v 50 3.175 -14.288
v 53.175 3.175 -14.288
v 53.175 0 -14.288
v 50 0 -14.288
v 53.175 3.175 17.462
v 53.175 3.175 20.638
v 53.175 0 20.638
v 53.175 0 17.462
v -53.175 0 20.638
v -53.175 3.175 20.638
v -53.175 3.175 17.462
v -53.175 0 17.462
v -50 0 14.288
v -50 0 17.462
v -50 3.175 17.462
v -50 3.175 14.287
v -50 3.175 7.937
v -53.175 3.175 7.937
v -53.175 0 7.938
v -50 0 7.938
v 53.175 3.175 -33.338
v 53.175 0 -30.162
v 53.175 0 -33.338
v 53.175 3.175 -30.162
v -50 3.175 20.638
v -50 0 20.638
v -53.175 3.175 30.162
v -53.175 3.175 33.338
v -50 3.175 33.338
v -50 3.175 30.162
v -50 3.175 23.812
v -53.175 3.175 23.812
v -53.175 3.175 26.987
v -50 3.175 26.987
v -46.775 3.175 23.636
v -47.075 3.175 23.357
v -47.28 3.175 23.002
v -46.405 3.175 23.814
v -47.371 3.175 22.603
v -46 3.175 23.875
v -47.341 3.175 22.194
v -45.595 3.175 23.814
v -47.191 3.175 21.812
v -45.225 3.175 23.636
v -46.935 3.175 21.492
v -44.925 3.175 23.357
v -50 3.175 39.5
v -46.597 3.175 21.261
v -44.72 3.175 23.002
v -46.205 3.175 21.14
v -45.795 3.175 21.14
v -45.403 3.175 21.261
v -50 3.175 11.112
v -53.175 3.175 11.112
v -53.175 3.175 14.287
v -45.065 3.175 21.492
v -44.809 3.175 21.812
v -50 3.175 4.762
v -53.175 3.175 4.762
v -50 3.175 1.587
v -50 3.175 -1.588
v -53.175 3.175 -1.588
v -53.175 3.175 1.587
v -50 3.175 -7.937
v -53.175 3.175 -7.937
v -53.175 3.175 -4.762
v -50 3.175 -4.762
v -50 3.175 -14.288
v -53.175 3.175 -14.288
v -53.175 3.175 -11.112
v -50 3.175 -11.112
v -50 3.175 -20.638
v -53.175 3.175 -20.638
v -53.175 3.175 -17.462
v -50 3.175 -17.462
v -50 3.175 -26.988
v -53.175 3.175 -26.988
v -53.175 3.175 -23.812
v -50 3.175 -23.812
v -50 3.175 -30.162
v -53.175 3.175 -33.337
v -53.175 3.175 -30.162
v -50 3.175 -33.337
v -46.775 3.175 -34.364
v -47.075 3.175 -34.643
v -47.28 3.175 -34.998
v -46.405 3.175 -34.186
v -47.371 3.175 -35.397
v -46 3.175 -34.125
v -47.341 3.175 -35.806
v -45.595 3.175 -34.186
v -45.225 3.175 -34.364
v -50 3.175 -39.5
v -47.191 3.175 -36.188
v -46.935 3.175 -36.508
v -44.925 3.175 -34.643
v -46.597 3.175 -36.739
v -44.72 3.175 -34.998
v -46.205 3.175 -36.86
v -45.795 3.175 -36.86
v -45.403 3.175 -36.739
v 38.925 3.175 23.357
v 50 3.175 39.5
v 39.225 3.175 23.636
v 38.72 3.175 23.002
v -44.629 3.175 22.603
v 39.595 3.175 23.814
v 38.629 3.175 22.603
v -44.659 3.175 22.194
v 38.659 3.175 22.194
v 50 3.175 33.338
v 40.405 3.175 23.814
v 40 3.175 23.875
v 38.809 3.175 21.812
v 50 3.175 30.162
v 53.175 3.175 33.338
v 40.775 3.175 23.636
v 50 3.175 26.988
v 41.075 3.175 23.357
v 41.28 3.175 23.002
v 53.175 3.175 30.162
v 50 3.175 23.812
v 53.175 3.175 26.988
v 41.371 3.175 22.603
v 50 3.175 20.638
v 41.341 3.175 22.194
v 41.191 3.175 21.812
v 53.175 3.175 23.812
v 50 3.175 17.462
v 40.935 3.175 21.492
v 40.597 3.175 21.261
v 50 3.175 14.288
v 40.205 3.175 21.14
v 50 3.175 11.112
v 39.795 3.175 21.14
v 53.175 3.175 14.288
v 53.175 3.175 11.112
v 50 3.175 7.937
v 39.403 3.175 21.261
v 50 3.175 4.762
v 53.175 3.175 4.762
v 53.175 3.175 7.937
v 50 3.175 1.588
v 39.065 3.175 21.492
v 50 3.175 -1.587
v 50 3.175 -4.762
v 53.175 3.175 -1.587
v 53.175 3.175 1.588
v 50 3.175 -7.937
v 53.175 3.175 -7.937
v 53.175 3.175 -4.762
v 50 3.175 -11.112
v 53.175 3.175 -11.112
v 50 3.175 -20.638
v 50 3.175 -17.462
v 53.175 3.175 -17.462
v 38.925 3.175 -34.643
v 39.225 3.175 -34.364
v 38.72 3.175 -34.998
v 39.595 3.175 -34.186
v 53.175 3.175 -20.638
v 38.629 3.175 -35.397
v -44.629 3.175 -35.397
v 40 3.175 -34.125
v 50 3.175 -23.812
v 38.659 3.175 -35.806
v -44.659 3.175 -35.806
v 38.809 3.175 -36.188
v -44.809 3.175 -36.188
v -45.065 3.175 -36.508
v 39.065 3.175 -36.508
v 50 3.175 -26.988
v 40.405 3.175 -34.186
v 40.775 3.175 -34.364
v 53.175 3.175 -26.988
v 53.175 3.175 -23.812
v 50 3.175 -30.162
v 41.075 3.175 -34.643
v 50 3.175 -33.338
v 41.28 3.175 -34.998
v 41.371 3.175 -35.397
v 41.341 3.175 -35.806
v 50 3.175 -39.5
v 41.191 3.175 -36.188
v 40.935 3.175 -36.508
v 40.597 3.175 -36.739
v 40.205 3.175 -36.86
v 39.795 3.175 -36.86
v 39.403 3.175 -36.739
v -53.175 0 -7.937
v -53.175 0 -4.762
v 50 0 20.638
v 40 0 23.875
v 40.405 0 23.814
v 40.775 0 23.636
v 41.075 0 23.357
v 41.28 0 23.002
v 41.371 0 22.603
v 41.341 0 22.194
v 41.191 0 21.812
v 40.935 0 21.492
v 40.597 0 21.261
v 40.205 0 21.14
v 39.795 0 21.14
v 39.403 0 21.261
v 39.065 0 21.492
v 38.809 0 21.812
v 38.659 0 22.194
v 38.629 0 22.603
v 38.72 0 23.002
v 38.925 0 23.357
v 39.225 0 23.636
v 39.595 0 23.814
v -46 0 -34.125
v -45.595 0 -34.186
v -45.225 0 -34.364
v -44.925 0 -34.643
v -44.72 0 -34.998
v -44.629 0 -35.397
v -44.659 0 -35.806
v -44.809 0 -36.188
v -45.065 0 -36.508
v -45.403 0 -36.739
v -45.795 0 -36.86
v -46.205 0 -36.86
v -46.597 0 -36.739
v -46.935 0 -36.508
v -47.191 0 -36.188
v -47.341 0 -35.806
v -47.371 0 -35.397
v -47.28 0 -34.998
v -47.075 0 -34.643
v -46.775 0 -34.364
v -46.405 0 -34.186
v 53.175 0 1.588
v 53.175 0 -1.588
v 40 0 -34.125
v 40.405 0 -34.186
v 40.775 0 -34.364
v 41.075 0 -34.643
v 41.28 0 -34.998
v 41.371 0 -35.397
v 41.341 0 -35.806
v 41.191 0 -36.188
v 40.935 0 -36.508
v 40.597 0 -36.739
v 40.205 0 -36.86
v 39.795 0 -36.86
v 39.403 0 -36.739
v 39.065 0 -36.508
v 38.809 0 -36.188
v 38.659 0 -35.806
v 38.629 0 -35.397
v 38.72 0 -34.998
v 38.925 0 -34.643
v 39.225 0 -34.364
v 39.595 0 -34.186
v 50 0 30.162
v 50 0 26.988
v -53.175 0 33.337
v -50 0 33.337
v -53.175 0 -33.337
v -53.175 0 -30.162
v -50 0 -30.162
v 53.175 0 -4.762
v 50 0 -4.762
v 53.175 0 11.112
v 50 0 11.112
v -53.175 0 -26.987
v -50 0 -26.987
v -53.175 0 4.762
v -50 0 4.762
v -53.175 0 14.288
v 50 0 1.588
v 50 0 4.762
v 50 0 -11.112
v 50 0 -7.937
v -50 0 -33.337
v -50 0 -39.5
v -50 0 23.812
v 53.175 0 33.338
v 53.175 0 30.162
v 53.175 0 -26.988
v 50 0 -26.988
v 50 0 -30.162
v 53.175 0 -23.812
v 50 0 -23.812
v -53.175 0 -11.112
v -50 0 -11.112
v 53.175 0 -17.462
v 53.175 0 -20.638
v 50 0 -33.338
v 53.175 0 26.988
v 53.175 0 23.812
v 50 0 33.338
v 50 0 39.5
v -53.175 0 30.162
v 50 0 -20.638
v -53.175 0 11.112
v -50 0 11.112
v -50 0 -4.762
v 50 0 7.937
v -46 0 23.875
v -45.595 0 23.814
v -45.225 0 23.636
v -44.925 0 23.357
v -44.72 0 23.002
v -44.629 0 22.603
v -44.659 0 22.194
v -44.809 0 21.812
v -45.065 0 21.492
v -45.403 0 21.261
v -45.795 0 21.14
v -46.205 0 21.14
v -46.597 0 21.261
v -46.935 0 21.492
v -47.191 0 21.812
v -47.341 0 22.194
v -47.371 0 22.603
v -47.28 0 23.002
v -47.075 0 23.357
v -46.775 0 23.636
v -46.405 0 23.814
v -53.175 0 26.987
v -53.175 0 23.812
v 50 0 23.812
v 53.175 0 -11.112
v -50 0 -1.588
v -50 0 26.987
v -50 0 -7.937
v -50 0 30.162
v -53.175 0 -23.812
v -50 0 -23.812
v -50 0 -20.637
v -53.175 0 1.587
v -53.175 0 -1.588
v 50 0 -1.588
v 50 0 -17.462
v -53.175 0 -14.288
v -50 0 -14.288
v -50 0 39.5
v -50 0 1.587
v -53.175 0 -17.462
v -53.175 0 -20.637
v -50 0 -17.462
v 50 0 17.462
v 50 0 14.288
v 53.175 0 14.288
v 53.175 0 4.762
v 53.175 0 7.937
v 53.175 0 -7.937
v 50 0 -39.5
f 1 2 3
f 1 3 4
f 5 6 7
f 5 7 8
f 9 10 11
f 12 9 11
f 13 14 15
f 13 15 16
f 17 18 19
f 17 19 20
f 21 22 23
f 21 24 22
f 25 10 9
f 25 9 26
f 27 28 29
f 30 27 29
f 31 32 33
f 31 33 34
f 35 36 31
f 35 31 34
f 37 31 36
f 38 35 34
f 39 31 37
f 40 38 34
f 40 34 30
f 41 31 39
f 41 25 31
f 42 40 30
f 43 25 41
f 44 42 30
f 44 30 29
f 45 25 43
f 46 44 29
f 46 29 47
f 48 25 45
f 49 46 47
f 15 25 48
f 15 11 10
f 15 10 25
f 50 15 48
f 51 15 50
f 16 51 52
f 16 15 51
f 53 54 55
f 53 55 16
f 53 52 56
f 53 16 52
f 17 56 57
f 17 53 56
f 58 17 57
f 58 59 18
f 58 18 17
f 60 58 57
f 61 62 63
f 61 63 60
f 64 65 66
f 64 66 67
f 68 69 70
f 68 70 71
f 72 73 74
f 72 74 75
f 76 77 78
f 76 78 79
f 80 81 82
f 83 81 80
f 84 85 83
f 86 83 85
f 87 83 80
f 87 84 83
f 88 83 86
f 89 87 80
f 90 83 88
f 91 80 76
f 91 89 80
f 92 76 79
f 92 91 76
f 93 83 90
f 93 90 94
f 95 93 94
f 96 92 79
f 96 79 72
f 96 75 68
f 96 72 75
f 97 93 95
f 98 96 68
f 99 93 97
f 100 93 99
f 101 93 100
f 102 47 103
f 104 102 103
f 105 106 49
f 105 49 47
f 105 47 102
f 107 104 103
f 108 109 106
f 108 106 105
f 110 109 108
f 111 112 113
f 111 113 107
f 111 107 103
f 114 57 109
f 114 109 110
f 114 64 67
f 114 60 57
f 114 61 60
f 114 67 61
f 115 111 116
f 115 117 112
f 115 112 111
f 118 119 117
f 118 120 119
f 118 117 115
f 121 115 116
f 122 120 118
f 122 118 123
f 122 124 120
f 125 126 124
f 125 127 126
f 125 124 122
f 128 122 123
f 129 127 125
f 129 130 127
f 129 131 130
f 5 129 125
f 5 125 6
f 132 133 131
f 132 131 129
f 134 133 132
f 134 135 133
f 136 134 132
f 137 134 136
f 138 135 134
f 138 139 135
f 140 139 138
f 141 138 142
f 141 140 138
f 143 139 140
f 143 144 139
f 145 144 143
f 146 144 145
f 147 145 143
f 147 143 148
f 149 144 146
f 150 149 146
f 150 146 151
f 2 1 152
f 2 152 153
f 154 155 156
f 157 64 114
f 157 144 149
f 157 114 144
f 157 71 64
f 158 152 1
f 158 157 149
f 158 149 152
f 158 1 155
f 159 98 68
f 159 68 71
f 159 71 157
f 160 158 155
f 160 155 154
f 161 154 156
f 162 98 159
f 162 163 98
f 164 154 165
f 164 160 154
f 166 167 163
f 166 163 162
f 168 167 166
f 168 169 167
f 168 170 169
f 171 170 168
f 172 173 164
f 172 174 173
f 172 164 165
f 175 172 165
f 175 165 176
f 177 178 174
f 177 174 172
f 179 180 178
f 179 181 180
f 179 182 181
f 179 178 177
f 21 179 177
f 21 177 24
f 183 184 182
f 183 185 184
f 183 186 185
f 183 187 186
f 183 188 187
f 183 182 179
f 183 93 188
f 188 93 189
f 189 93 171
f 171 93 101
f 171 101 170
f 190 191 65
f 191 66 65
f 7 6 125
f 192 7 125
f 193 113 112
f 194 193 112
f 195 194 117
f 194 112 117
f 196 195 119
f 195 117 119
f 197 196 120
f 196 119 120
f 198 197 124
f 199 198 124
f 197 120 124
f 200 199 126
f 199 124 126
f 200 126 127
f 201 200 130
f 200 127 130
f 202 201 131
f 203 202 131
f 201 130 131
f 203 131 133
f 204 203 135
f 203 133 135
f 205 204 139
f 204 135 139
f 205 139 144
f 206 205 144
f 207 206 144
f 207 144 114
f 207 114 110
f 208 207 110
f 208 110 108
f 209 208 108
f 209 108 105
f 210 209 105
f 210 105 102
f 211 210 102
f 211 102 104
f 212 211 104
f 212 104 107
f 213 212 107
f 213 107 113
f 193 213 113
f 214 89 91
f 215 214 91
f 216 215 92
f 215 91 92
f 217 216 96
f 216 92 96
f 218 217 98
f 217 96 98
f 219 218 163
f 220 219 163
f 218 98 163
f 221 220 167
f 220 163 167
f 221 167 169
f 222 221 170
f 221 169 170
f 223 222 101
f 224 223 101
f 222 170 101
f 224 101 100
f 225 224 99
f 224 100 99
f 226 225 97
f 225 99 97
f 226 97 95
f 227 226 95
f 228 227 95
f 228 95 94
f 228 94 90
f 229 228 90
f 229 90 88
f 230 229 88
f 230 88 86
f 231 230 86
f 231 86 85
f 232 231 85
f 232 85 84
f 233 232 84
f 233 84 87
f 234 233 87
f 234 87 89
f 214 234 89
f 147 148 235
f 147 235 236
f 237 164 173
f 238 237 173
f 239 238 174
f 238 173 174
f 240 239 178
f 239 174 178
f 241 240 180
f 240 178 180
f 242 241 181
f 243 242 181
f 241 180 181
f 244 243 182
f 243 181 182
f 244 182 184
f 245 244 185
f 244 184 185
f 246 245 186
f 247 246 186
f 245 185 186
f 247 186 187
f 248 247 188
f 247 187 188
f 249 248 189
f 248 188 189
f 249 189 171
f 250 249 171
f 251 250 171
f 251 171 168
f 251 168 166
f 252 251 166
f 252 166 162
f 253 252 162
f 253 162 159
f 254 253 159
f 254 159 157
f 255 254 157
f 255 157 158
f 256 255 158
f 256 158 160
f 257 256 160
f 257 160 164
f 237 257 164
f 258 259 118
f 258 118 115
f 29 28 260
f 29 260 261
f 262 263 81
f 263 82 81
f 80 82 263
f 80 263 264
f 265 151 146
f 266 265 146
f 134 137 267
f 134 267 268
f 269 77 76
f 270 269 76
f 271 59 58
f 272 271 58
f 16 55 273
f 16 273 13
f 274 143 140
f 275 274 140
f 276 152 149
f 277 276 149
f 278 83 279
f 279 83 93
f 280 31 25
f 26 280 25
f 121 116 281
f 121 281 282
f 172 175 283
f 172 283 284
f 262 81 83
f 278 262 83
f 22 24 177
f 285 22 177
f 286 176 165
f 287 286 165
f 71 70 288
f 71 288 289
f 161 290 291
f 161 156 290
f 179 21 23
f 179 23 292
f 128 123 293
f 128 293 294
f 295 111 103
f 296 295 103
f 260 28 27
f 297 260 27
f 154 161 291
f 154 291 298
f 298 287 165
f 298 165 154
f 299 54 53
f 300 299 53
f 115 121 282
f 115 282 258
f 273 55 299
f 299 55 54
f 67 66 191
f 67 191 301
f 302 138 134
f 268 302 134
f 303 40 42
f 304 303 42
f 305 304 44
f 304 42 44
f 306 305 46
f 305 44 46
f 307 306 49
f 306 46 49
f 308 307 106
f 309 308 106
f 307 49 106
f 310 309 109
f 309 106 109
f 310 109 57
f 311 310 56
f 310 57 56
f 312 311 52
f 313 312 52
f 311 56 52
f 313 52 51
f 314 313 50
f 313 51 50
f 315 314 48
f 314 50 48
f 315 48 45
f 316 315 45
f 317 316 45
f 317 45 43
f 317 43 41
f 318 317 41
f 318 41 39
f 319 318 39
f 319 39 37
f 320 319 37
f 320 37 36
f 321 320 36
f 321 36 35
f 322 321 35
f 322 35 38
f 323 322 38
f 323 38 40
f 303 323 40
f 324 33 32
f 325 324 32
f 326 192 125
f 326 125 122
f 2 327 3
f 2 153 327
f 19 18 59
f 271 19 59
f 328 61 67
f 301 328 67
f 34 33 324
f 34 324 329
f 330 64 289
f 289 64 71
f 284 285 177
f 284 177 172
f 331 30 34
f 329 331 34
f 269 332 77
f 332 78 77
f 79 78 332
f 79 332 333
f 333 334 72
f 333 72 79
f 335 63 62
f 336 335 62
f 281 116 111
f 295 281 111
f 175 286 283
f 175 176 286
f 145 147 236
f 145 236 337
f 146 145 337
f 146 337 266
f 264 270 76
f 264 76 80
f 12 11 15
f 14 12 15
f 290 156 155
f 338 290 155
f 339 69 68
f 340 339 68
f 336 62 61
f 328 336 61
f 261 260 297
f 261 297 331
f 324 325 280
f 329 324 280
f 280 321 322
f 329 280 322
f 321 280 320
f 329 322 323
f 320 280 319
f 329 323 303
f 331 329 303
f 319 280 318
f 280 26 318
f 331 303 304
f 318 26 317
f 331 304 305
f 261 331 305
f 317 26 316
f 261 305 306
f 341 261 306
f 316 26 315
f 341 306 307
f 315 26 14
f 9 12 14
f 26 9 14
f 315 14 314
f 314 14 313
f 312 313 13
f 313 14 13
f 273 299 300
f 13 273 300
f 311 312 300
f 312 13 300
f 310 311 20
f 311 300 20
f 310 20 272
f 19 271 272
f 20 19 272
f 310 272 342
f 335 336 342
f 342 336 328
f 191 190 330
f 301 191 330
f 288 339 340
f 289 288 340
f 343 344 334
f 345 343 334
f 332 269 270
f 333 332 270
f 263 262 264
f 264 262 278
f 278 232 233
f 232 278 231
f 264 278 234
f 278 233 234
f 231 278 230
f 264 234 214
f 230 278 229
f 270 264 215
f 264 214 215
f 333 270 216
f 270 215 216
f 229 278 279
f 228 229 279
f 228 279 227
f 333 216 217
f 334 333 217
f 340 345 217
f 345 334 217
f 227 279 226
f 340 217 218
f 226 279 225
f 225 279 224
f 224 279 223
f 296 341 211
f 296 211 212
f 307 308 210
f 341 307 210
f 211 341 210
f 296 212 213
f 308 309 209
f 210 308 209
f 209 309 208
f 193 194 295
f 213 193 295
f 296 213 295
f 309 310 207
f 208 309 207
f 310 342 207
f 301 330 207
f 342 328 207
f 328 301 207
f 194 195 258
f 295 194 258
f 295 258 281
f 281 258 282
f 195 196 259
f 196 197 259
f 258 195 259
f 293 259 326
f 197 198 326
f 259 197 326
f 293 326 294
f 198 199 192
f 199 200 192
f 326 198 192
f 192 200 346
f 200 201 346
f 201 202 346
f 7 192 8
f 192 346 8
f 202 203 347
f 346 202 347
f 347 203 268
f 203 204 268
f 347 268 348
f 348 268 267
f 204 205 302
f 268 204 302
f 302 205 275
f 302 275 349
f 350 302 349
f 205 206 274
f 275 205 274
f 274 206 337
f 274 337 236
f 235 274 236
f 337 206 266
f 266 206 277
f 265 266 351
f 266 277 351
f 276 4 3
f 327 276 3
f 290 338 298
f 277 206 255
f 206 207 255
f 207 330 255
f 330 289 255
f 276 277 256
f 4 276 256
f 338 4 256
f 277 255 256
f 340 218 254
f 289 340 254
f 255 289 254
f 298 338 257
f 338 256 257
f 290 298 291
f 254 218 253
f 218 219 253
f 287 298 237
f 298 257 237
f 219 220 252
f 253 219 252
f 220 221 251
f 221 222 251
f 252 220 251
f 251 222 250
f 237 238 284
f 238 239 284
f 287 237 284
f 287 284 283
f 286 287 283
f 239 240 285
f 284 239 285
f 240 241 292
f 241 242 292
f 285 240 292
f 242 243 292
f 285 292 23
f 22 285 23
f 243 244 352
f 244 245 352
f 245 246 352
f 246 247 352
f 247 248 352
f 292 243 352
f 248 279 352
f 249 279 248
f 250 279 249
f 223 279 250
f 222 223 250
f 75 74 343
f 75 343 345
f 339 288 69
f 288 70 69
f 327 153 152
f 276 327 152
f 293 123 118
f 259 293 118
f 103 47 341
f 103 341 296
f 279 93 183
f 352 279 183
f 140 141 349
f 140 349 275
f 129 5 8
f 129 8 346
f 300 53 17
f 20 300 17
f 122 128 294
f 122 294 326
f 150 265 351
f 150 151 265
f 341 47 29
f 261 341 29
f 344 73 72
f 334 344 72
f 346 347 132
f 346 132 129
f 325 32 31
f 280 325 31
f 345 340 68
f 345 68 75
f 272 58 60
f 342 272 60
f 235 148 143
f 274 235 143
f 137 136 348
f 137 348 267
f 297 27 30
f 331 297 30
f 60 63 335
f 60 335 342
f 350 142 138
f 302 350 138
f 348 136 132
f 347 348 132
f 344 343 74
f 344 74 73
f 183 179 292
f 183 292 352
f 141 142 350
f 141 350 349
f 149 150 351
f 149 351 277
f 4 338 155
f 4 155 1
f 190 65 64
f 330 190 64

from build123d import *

# Parameters (mm, degrees)
SKETCH1_W                = 100
SKETCH1_H                = 79
BOSS_EXTRUDE1_DEPTH      = 3.175
SKETCH3_R                = 1.375
CUT_EXTRUDE1_DEPTH       = 10
SKETCH4_W                = 6.35
SKETCH4_H                = 79
BOSS_EXTRUDE2_DEPTH      = 3.175
SKETCH5_W                = 3.175
SKETCH5_H                = 3.175
CUT_EXTRUDE2_DEPTH       = 10
LPATTERN1_COUNT          = 7
LPATTERN1_PITCH          = 6.35
LPATTERN1_COUNT_DIR2     = 7
LPATTERN1_PITCH_DIR2     = 6.35
SKETCH6_W                = 3.175
SKETCH6_H                = 2.9875
CUT_EXTRUDE3_DEPTH       = 10
MIRROR1_COPY_1_SKETCH_W  = 3.175
MIRROR1_COPY_1_SKETCH_H  = 3.175
MIRROR1_COPY_1_DEPTH     = 10
MIRROR1_COPY_2_SKETCH_W  = 3.175
MIRROR1_COPY_2_SKETCH_H  = 3.175
MIRROR1_COPY_2_DEPTH     = 10
MIRROR1_COPY_3_SKETCH_W  = 3.175
MIRROR1_COPY_3_SKETCH_H  = 3.175
MIRROR1_COPY_3_DEPTH     = 10
MIRROR1_COPY_4_SKETCH_W  = 3.175
MIRROR1_COPY_4_SKETCH_H  = 3.175
MIRROR1_COPY_4_DEPTH     = 10
MIRROR1_COPY_5_SKETCH_W  = 3.175
MIRROR1_COPY_5_SKETCH_H  = 3.175
MIRROR1_COPY_5_DEPTH     = 10
MIRROR1_COPY_6_SKETCH_W  = 3.175
MIRROR1_COPY_6_SKETCH_H  = 3.175
MIRROR1_COPY_6_DEPTH     = 10
MIRROR1_COPY_7_SKETCH_W  = 3.175
MIRROR1_COPY_7_SKETCH_H  = 3.175
MIRROR1_COPY_7_DEPTH     = 10
MIRROR1_COPY_8_SKETCH_W  = 3.175
MIRROR1_COPY_8_SKETCH_H  = 3.175
MIRROR1_COPY_8_DEPTH     = 10
MIRROR1_COPY_9_SKETCH_W  = 3.175
MIRROR1_COPY_9_SKETCH_H  = 3.175
MIRROR1_COPY_9_DEPTH     = 10
MIRROR1_COPY_10_SKETCH_W = 3.175
MIRROR1_COPY_10_SKETCH_H = 3.175
MIRROR1_COPY_10_DEPTH    = 10
MIRROR1_COPY_11_SKETCH_W = 3.175
MIRROR1_COPY_11_SKETCH_H = 3.175
MIRROR1_COPY_11_DEPTH    = 10
MIRROR1_COPY_12_SKETCH_W = 3.175
MIRROR1_COPY_12_SKETCH_H = 3.175
MIRROR1_COPY_12_DEPTH    = 10
MIRROR1_COPY_13_SKETCH_W = 3.175
MIRROR1_COPY_13_SKETCH_H = 3.175
MIRROR1_COPY_13_DEPTH    = 10
MIRROR1_COPY_14_SKETCH_W = 3.175
MIRROR1_COPY_14_SKETCH_H = 3.175
MIRROR1_COPY_14_DEPTH    = 10
MIRROR1_COPY_15_SKETCH_W = 3.175
MIRROR1_COPY_15_SKETCH_H = 3.175
MIRROR1_COPY_15_DEPTH    = 10
MIRROR1_COPY_16_SKETCH_W = 3.175
MIRROR1_COPY_16_SKETCH_H = 3.175
MIRROR1_COPY_16_DEPTH    = 10
MIRROR1_COPY_17_SKETCH_W = 3.175
MIRROR1_COPY_17_SKETCH_H = 3.175
MIRROR1_COPY_17_DEPTH    = 10
MIRROR1_COPY_18_SKETCH_W = 3.175
MIRROR1_COPY_18_SKETCH_H = 3.175
MIRROR1_COPY_18_DEPTH    = 10
MIRROR1_COPY_19_SKETCH_W = 3.175
MIRROR1_COPY_19_SKETCH_H = 3.175
MIRROR1_COPY_19_DEPTH    = 10
MIRROR1_COPY_20_SKETCH_W = 3.175
MIRROR1_COPY_20_SKETCH_H = 3.175
MIRROR1_COPY_20_DEPTH    = 10
MIRROR1_COPY_21_SKETCH_W = 3.175
MIRROR1_COPY_21_SKETCH_H = 3.175
MIRROR1_COPY_21_DEPTH    = 10
MIRROR1_COPY_22_SKETCH_W = 3.175
MIRROR1_COPY_22_SKETCH_H = 3.175
MIRROR1_COPY_22_DEPTH    = 10
MIRROR1_COPY_23_SKETCH_W = 3.175
MIRROR1_COPY_23_SKETCH_H = 3.175
MIRROR1_COPY_23_DEPTH    = 10
MIRROR1_COPY_24_SKETCH_W = 3.175
MIRROR1_COPY_24_SKETCH_H = 3.175
MIRROR1_COPY_24_DEPTH    = 10
MIRROR1_COPY_25_SKETCH_W = 3.175
MIRROR1_COPY_25_SKETCH_H = 3.175
MIRROR1_COPY_25_DEPTH    = 10
MIRROR1_COPY_26_SKETCH_W = 3.175
MIRROR1_COPY_26_SKETCH_H = 3.175
MIRROR1_COPY_26_DEPTH    = 10
MIRROR1_COPY_27_SKETCH_W = 3.175
MIRROR1_COPY_27_SKETCH_H = 3.175
MIRROR1_COPY_27_DEPTH    = 10
MIRROR1_COPY_28_SKETCH_W = 3.175
MIRROR1_COPY_28_SKETCH_H = 3.175
MIRROR1_COPY_28_DEPTH    = 10
MIRROR1_COPY_29_SKETCH_W = 3.175
MIRROR1_COPY_29_SKETCH_H = 3.175
MIRROR1_COPY_29_DEPTH    = 10
MIRROR1_COPY_30_SKETCH_W = 3.175
MIRROR1_COPY_30_SKETCH_H = 3.175
MIRROR1_COPY_30_DEPTH    = 10
MIRROR1_COPY_31_SKETCH_W = 3.175
MIRROR1_COPY_31_SKETCH_H = 3.175
MIRROR1_COPY_31_DEPTH    = 10
MIRROR1_COPY_32_SKETCH_W = 3.175
MIRROR1_COPY_32_SKETCH_H = 3.175
MIRROR1_COPY_32_DEPTH    = 10
MIRROR1_COPY_33_SKETCH_W = 3.175
MIRROR1_COPY_33_SKETCH_H = 3.175
MIRROR1_COPY_33_DEPTH    = 10
MIRROR1_COPY_34_SKETCH_W = 3.175
MIRROR1_COPY_34_SKETCH_H = 3.175
MIRROR1_COPY_34_DEPTH    = 10
MIRROR1_COPY_35_SKETCH_W = 3.175
MIRROR1_COPY_35_SKETCH_H = 3.175
MIRROR1_COPY_35_DEPTH    = 10
MIRROR1_COPY_36_SKETCH_W = 3.175
MIRROR1_COPY_36_SKETCH_H = 3.175
MIRROR1_COPY_36_DEPTH    = 10
MIRROR1_COPY_37_SKETCH_W = 3.175
MIRROR1_COPY_37_SKETCH_H = 3.175
MIRROR1_COPY_37_DEPTH    = 10
MIRROR1_COPY_38_SKETCH_W = 3.175
MIRROR1_COPY_38_SKETCH_H = 3.175
MIRROR1_COPY_38_DEPTH    = 10
MIRROR1_COPY_39_SKETCH_W = 3.175
MIRROR1_COPY_39_SKETCH_H = 3.175
MIRROR1_COPY_39_DEPTH    = 10
MIRROR1_COPY_40_SKETCH_W = 3.175
MIRROR1_COPY_40_SKETCH_H = 3.175
MIRROR1_COPY_40_DEPTH    = 10
MIRROR1_COPY_41_SKETCH_W = 3.175
MIRROR1_COPY_41_SKETCH_H = 3.175
MIRROR1_COPY_41_DEPTH    = 10
MIRROR1_COPY_42_SKETCH_W = 3.175
MIRROR1_COPY_42_SKETCH_H = 3.175
MIRROR1_COPY_42_DEPTH    = 10
MIRROR1_COPY_43_SKETCH_W = 3.175
MIRROR1_COPY_43_SKETCH_H = 3.175
MIRROR1_COPY_43_DEPTH    = 10
MIRROR1_COPY_44_SKETCH_W = 3.175
MIRROR1_COPY_44_SKETCH_H = 3.175
MIRROR1_COPY_44_DEPTH    = 10
MIRROR1_COPY_45_SKETCH_W = 3.175
MIRROR1_COPY_45_SKETCH_H = 3.175
MIRROR1_COPY_45_DEPTH    = 10
MIRROR1_COPY_46_SKETCH_W = 3.175
MIRROR1_COPY_46_SKETCH_H = 3.175
MIRROR1_COPY_46_DEPTH    = 10
MIRROR1_COPY_47_SKETCH_W = 3.175
MIRROR1_COPY_47_SKETCH_H = 3.175
MIRROR1_COPY_47_DEPTH    = 10
SKETCH7_W                = 6
SKETCH7_H                = 79
SKETCH7_R                = 1.5
BOSS_EXTRUDE3_DEPTH      = 3.175
SKETCH8_W                = 3.175
SKETCH8_H                = 79
BOSS_EXTRUDE4_DEPTH      = 3.175
SKETCH10_W               = 12.35
SKETCH10_H               = 79
CUT_EXTRUDE4_DEPTH       = 10


with BuildPart() as part:
    # Sketch1 → Boss-Extrude1 (new body)
    with BuildSketch(Plane(origin=(0, 0, 0), x_dir=(1, 0, 0), z_dir=(0, 1, 0))):
        Rectangle(SKETCH1_W, SKETCH1_H)
    extrude(amount=BOSS_EXTRUDE1_DEPTH)

    # Sketch3 → Cut-Extrude1 (cut)
    with BuildSketch(Plane(origin=(0, 3.175, 0), x_dir=(1, 0, 0), z_dir=(0, 1, 0))):
        with Locations(Location((-46, 35.5, 0), (0, 0, 270))):
            Circle(SKETCH3_R)
        with Locations(Location((-46, -22.5, 0), (0, 0, 270))):
            Circle(SKETCH3_R)
        with Locations(Location((40, 35.5, 0), (0, 0, 270))):
            Circle(SKETCH3_R)
        with Locations(Location((40, -22.5, 0), (0, 0, 270))):
            Circle(SKETCH3_R)
    extrude(amount=-CUT_EXTRUDE1_DEPTH, mode=Mode.SUBTRACT)

    # Sketch4 → Boss-Extrude2 (add)
    with BuildSketch(Plane(origin=(0, 3.175, 0), x_dir=(1, 0, 0), z_dir=(0, 1, 0))):
        with Locations((-53.175, 0)):
            Rectangle(SKETCH4_W, SKETCH4_H)
        with Locations((53.175, 0)):
            Rectangle(SKETCH4_W, SKETCH4_H)
    extrude(amount=-BOSS_EXTRUDE2_DEPTH)

    # Sketch5 → Cut-Extrude2 (cut)
    with BuildSketch(Plane(origin=(0, 3.175, 0), x_dir=(1, 0, 0), z_dir=(0, 1, 0))):
        with Locations((-51.5875, 3.175)):
            Rectangle(SKETCH5_W, SKETCH5_H)
    cut_extrude2 = extrude(amount=-CUT_EXTRUDE2_DEPTH, mode=Mode.SUBTRACT)

    # LPattern1: Cut-Extrude2 7 × 7, 1 skipped
    with Locations(*[Vector(0, 0, 1) * (i * LPATTERN1_PITCH) + Vector(0, 0, -1) * (j * LPATTERN1_PITCH_DIR2) for i in range(LPATTERN1_COUNT) for j in range(LPATTERN1_COUNT_DIR2) if (i, j) not in ((0, 0), (0, 6))]):
        add(cut_extrude2, mode=Mode.SUBTRACT)

    # Sketch6 → Cut-Extrude3 (cut)
    with BuildSketch(Plane(origin=(0, 3.175, 0), x_dir=(1, 0, 0), z_dir=(0, 1, 0))):
        with Locations((-51.5875, 38.00625)):
            Rectangle(SKETCH6_W, SKETCH6_H)
        with Locations((-51.5875, -38.00625)):
            Rectangle(SKETCH6_W, SKETCH6_H)
    cut_extrude3 = extrude(amount=-CUT_EXTRUDE3_DEPTH, mode=Mode.SUBTRACT)

    # Mirror1: Cut-Extrude2, Cut-Extrude3 across plane
    add(cut_extrude2.mirror(Plane(origin=(0, 0, 0), x_dir=(0, 0, 1), z_dir=(1, 0, 0))), mode=Mode.SUBTRACT)
    add(cut_extrude3.mirror(Plane(origin=(0, 0, 0), x_dir=(0, 0, 1), z_dir=(1, 0, 0))), mode=Mode.SUBTRACT)

    # Mirror1 copy 1 sketch → Mirror1 copy 1 (cut)
    with BuildSketch(Plane(origin=(0, 3.175, -6.35), x_dir=(-1, 0, 0), z_dir=(0, 1, 0))):
        with Locations((-51.5875, -3.175)):
            Rectangle(MIRROR1_COPY_1_SKETCH_W, MIRROR1_COPY_1_SKETCH_H)
    extrude(amount=-MIRROR1_COPY_1_DEPTH, mode=Mode.SUBTRACT)

    # Mirror1 copy 2 sketch → Mirror1 copy 2 (cut)
    with BuildSketch(Plane(origin=(0, 3.175, -12.7), x_dir=(-1, 0, 0), z_dir=(0, 1, 0))):
        with Locations((-51.5875, -3.175)):
            Rectangle(MIRROR1_COPY_2_SKETCH_W, MIRROR1_COPY_2_SKETCH_H)
    extrude(amount=-MIRROR1_COPY_2_DEPTH, mode=Mode.SUBTRACT)

    # Mirror1 copy 3 sketch → Mirror1 copy 3 (cut)
    with BuildSketch(Plane(origin=(0, 3.175, -19.05), x_dir=(-1, 0, 0), z_dir=(0, 1, 0))):
        with Locations((-51.5875, -3.175)):
            Rectangle(MIRROR1_COPY_3_SKETCH_W, MIRROR1_COPY_3_SKETCH_H)
    extrude(amount=-MIRROR1_COPY_3_DEPTH, mode=Mode.SUBTRACT)

    # Mirror1 copy 4 sketch → Mirror1 copy 4 (cut)
    with BuildSketch(Plane(origin=(0, 3.175, -25.4), x_dir=(-1, 0, 0), z_dir=(0, 1, 0))):
        with Locations((-51.5875, -3.175)):
            Rectangle(MIRROR1_COPY_4_SKETCH_W, MIRROR1_COPY_4_SKETCH_H)
    extrude(amount=-MIRROR1_COPY_4_DEPTH, mode=Mode.SUBTRACT)

    # Mirror1 copy 5 sketch → Mirror1 copy 5 (cut)
    with BuildSketch(Plane(origin=(0, 3.175, -31.75), x_dir=(-1, 0, 0), z_dir=(0, 1, 0))):
        with Locations((-51.5875, -3.175)):
            Rectangle(MIRROR1_COPY_5_SKETCH_W, MIRROR1_COPY_5_SKETCH_H)
    extrude(amount=-MIRROR1_COPY_5_DEPTH, mode=Mode.SUBTRACT)

    # Mirror1 copy 6 sketch → Mirror1 copy 6 (cut)
    with BuildSketch(Plane(origin=(0, 3.175, 6.35), x_dir=(-1, 0, 0), z_dir=(0, 1, 0))):
        with Locations((-51.5875, -3.175)):
            Rectangle(MIRROR1_COPY_6_SKETCH_W, MIRROR1_COPY_6_SKETCH_H)
    extrude(amount=-MIRROR1_COPY_6_DEPTH, mode=Mode.SUBTRACT)

    # Mirror1 copy 7 sketch → Mirror1 copy 7 (cut)
    with BuildSketch(Plane(origin=(0, 3.175, 0), x_dir=(-1, 0, 0), z_dir=(0, 1, 0))):
        with Locations((-51.5875, -3.175)):
            Rectangle(MIRROR1_COPY_7_SKETCH_W, MIRROR1_COPY_7_SKETCH_H)
    extrude(amount=-MIRROR1_COPY_7_DEPTH, mode=Mode.SUBTRACT)

    # Mirror1 copy 8 sketch → Mirror1 copy 8 (cut)
    with BuildSketch(Plane(origin=(0, 3.175, -6.35), x_dir=(-1, 0, 0), z_dir=(0, 1, 0))):
        with Locations((-51.5875, -3.175)):
            Rectangle(MIRROR1_COPY_8_SKETCH_W, MIRROR1_COPY_8_SKETCH_H)
    extrude(amount=-MIRROR1_COPY_8_DEPTH, mode=Mode.SUBTRACT)

    # Mirror1 copy 9 sketch → Mirror1 copy 9 (cut)
    with BuildSketch(Plane(origin=(0, 3.175, -12.7), x_dir=(-1, 0, 0), z_dir=(0, 1, 0))):
        with Locations((-51.5875, -3.175)):
            Rectangle(MIRROR1_COPY_9_SKETCH_W, MIRROR1_COPY_9_SKETCH_H)
    extrude(amount=-MIRROR1_COPY_9_DEPTH, mode=Mode.SUBTRACT)

    # Mirror1 copy 10 sketch → Mirror1 copy 10 (cut)
    with BuildSketch(Plane(origin=(0, 3.175, -19.05), x_dir=(-1, 0, 0), z_dir=(0, 1, 0))):
        with Locations((-51.5875, -3.175)):
            Rectangle(MIRROR1_COPY_10_SKETCH_W, MIRROR1_COPY_10_SKETCH_H)
    extrude(amount=-MIRROR1_COPY_10_DEPTH, mode=Mode.SUBTRACT)

    # Mirror1 copy 11 sketch → Mirror1 copy 11 (cut)
    with BuildSketch(Plane(origin=(0, 3.175, -25.4), x_dir=(-1, 0, 0), z_dir=(0, 1, 0))):
        with Locations((-51.5875, -3.175)):
            Rectangle(MIRROR1_COPY_11_SKETCH_W, MIRROR1_COPY_11_SKETCH_H)
    extrude(amount=-MIRROR1_COPY_11_DEPTH, mode=Mode.SUBTRACT)

    # Mirror1 copy 12 sketch → Mirror1 copy 12 (cut)
    with BuildSketch(Plane(origin=(0, 3.175, -31.75), x_dir=(-1, 0, 0), z_dir=(0, 1, 0))):
        with Locations((-51.5875, -3.175)):
            Rectangle(MIRROR1_COPY_12_SKETCH_W, MIRROR1_COPY_12_SKETCH_H)
    extrude(amount=-MIRROR1_COPY_12_DEPTH, mode=Mode.SUBTRACT)

    # Mirror1 copy 13 sketch → Mirror1 copy 13 (cut)
    with BuildSketch(Plane(origin=(0, 3.175, 12.7), x_dir=(-1, 0, 0), z_dir=(0, 1, 0))):
        with Locations((-51.5875, -3.175)):
            Rectangle(MIRROR1_COPY_13_SKETCH_W, MIRROR1_COPY_13_SKETCH_H)
    extrude(amount=-MIRROR1_COPY_13_DEPTH, mode=Mode.SUBTRACT)

    # Mirror1 copy 14 sketch → Mirror1 copy 14 (cut)
    with BuildSketch(Plane(origin=(0, 3.175, 6.35), x_dir=(-1, 0, 0), z_dir=(0, 1, 0))):
        with Locations((-51.5875, -3.175)):
            Rectangle(MIRROR1_COPY_14_SKETCH_W, MIRROR1_COPY_14_SKETCH_H)
    extrude(amount=-MIRROR1_COPY_14_DEPTH, mode=Mode.SUBTRACT)

    # Mirror1 copy 15 sketch → Mirror1 copy 15 (cut)
    with BuildSketch(Plane(origin=(0, 3.175, 0), x_dir=(-1, 0, 0), z_dir=(0, 1, 0))):
        with Locations((-51.5875, -3.175)):
            Rectangle(MIRROR1_COPY_15_SKETCH_W, MIRROR1_COPY_15_SKETCH_H)
    extrude(amount=-MIRROR1_COPY_15_DEPTH, mode=Mode.SUBTRACT)

    # Mirror1 copy 16 sketch → Mirror1 copy 16 (cut)
    with BuildSketch(Plane(origin=(0, 3.175, -6.35), x_dir=(-1, 0, 0), z_dir=(0, 1, 0))):
        with Locations((-51.5875, -3.175)):
            Rectangle(MIRROR1_COPY_16_SKETCH_W, MIRROR1_COPY_16_SKETCH_H)
    extrude(amount=-MIRROR1_COPY_16_DEPTH, mode=Mode.SUBTRACT)

    # Mirror1 copy 17 sketch → Mirror1 copy 17 (cut)
    with BuildSketch(Plane(origin=(0, 3.175, -12.7), x_dir=(-1, 0, 0), z_dir=(0, 1, 0))):
        with Locations((-51.5875, -3.175)):
            Rectangle(MIRROR1_COPY_17_SKETCH_W, MIRROR1_COPY_17_SKETCH_H)
    extrude(amount=-MIRROR1_COPY_17_DEPTH, mode=Mode.SUBTRACT)

    # Mirror1 copy 18 sketch → Mirror1 copy 18 (cut)
    with BuildSketch(Plane(origin=(0, 3.175, -19.05), x_dir=(-1, 0, 0), z_dir=(0, 1, 0))):
        with Locations((-51.5875, -3.175)):
            Rectangle(MIRROR1_COPY_18_SKETCH_W, MIRROR1_COPY_18_SKETCH_H)
    extrude(amount=-MIRROR1_COPY_18_DEPTH, mode=Mode.SUBTRACT)

    # Mirror1 copy 19 sketch → Mirror1 copy 19 (cut)
    with BuildSketch(Plane(origin=(0, 3.175, -25.4), x_dir=(-1, 0, 0), z_dir=(0, 1, 0))):
        with Locations((-51.5875, -3.175)):
            Rectangle(MIRROR1_COPY_19_SKETCH_W, MIRROR1_COPY_19_SKETCH_H)
    extrude(amount=-MIRROR1_COPY_19_DEPTH, mode=Mode.SUBTRACT)

    # Mirror1 copy 20 sketch → Mirror1 copy 20 (cut)
    with BuildSketch(Plane(origin=(0, 3.175, 19.05), x_dir=(-1, 0, 0), z_dir=(0, 1, 0))):
        with Locations((-51.5875, -3.175)):
            Rectangle(MIRROR1_COPY_20_SKETCH_W, MIRROR1_COPY_20_SKETCH_H)
    extrude(amount=-MIRROR1_COPY_20_DEPTH, mode=Mode.SUBTRACT)

    # Mirror1 copy 21 sketch → Mirror1 copy 21 (cut)
    with BuildSketch(Plane(origin=(0, 3.175, 12.7), x_dir=(-1, 0, 0), z_dir=(0, 1, 0))):
        with Locations((-51.5875, -3.175)):
            Rectangle(MIRROR1_COPY_21_SKETCH_W, MIRROR1_COPY_21_SKETCH_H)
    extrude(amount=-MIRROR1_COPY_21_DEPTH, mode=Mode.SUBTRACT)

    # Mirror1 copy 22 sketch → Mirror1 copy 22 (cut)
    with BuildSketch(Plane(origin=(0, 3.175, 6.35), x_dir=(-1, 0, 0), z_dir=(0, 1, 0))):
        with Locations((-51.5875, -3.175)):
            Rectangle(MIRROR1_COPY_22_SKETCH_W, MIRROR1_COPY_22_SKETCH_H)
    extrude(amount=-MIRROR1_COPY_22_DEPTH, mode=Mode.SUBTRACT)

    # Mirror1 copy 23 sketch → Mirror1 copy 23 (cut)
    with BuildSketch(Plane(origin=(0, 3.175, 0), x_dir=(-1, 0, 0), z_dir=(0, 1, 0))):
        with Locations((-51.5875, -3.175)):
            Rectangle(MIRROR1_COPY_23_SKETCH_W, MIRROR1_COPY_23_SKETCH_H)
    extrude(amount=-MIRROR1_COPY_23_DEPTH, mode=Mode.SUBTRACT)

    # Mirror1 copy 24 sketch → Mirror1 copy 24 (cut)
    with BuildSketch(Plane(origin=(0, 3.175, -6.35), x_dir=(-1, 0, 0), z_dir=(0, 1, 0))):
        with Locations((-51.5875, -3.175)):
            Rectangle(MIRROR1_COPY_24_SKETCH_W, MIRROR1_COPY_24_SKETCH_H)
    extrude(amount=-MIRROR1_COPY_24_DEPTH, mode=Mode.SUBTRACT)

    # Mirror1 copy 25 sketch → Mirror1 copy 25 (cut)
    with BuildSketch(Plane(origin=(0, 3.175, -12.7), x_dir=(-1, 0, 0), z_dir=(0, 1, 0))):
        with Locations((-51.5875, -3.175)):
            Rectangle(MIRROR1_COPY_25_SKETCH_W, MIRROR1_COPY_25_SKETCH_H)
    extrude(amount=-MIRROR1_COPY_25_DEPTH, mode=Mode.SUBTRACT)

    # Mirror1 copy 26 sketch → Mirror1 copy 26 (cut)
    with BuildSketch(Plane(origin=(0, 3.175, -19.05), x_dir=(-1, 0, 0), z_dir=(0, 1, 0))):
        with Locations((-51.5875, -3.175)):
            Rectangle(MIRROR1_COPY_26_SKETCH_W, MIRROR1_COPY_26_SKETCH_H)
    extrude(amount=-MIRROR1_COPY_26_DEPTH, mode=Mode.SUBTRACT)

    # Mirror1 copy 27 sketch → Mirror1 copy 27 (cut)
    with BuildSketch(Plane(origin=(0, 3.175, 25.4), x_dir=(-1, 0, 0), z_dir=(0, 1, 0))):
        with Locations((-51.5875, -3.175)):
            Rectangle(MIRROR1_COPY_27_SKETCH_W, MIRROR1_COPY_27_SKETCH_H)
    extrude(amount=-MIRROR1_COPY_27_DEPTH, mode=Mode.SUBTRACT)

    # Mirror1 copy 28 sketch → Mirror1 copy 28 (cut)
    with BuildSketch(Plane(origin=(0, 3.175, 19.05), x_dir=(-1, 0, 0), z_dir=(0, 1, 0))):
        with Locations((-51.5875, -3.175)):
            Rectangle(MIRROR1_COPY_28_SKETCH_W, MIRROR1_COPY_28_SKETCH_H)
    extrude(amount=-MIRROR1_COPY_28_DEPTH, mode=Mode.SUBTRACT)

    # Mirror1 copy 29 sketch → Mirror1 copy 29 (cut)
    with BuildSketch(Plane(origin=(0, 3.175, 12.7), x_dir=(-1, 0, 0), z_dir=(0, 1, 0))):
        with Locations((-51.5875, -3.175)):
            Rectangle(MIRROR1_COPY_29_SKETCH_W, MIRROR1_COPY_29_SKETCH_H)
    extrude(amount=-MIRROR1_COPY_29_DEPTH, mode=Mode.SUBTRACT)

    # Mirror1 copy 30 sketch → Mirror1 copy 30 (cut)
    with BuildSketch(Plane(origin=(0, 3.175, 6.35), x_dir=(-1, 0, 0), z_dir=(0, 1, 0))):
        with Locations((-51.5875, -3.175)):
            Rectangle(MIRROR1_COPY_30_SKETCH_W, MIRROR1_COPY_30_SKETCH_H)
    extrude(amount=-MIRROR1_COPY_30_DEPTH, mode=Mode.SUBTRACT)

    # Mirror1 copy 31 sketch → Mirror1 copy 31 (cut)
    with BuildSketch(Plane(origin=(0, 3.175, 0), x_dir=(-1, 0, 0), z_dir=(0, 1, 0))):
        with Locations((-51.5875, -3.175)):
            Rectangle(MIRROR1_COPY_31_SKETCH_W, MIRROR1_COPY_31_SKETCH_H)
    extrude(amount=-MIRROR1_COPY_31_DEPTH, mode=Mode.SUBTRACT)

    # Mirror1 copy 32 sketch → Mirror1 copy 32 (cut)
    with BuildSketch(Plane(origin=(0, 3.175, -6.35), x_dir=(-1, 0, 0), z_dir=(0, 1, 0))):
        with Locations((-51.5875, -3.175)):
            Rectangle(MIRROR1_COPY_32_SKETCH_W, MIRROR1_COPY_32_SKETCH_H)
    extrude(amount=-MIRROR1_COPY_32_DEPTH, mode=Mode.SUBTRACT)

    # Mirror1 copy 33 sketch → Mirror1 copy 33 (cut)
    with BuildSketch(Plane(origin=(0, 3.175, -12.7), x_dir=(-1, 0, 0), z_dir=(0, 1, 0))):
        with Locations((-51.5875, -3.175)):
            Rectangle(MIRROR1_COPY_33_SKETCH_W, MIRROR1_COPY_33_SKETCH_H)
    extrude(amount=-MIRROR1_COPY_33_DEPTH, mode=Mode.SUBTRACT)

    # Mirror1 copy 34 sketch → Mirror1 copy 34 (cut)
    with BuildSketch(Plane(origin=(0, 3.175, 31.75), x_dir=(-1, 0, 0), z_dir=(0, 1, 0))):
        with Locations((-51.5875, -3.175)):
            Rectangle(MIRROR1_COPY_34_SKETCH_W, MIRROR1_COPY_34_SKETCH_H)
    extrude(amount=-MIRROR1_COPY_34_DEPTH, mode=Mode.SUBTRACT)

    # Mirror1 copy 35 sketch → Mirror1 copy 35 (cut)
    with BuildSketch(Plane(origin=(0, 3.175, 25.4), x_dir=(-1, 0, 0), z_dir=(0, 1, 0))):
        with Locations((-51.5875, -3.175)):
            Rectangle(MIRROR1_COPY_35_SKETCH_W, MIRROR1_COPY_35_SKETCH_H)
    extrude(amount=-MIRROR1_COPY_35_DEPTH, mode=Mode.SUBTRACT)

    # Mirror1 copy 36 sketch → Mirror1 copy 36 (cut)
    with BuildSketch(Plane(origin=(0, 3.175, 19.05), x_dir=(-1, 0, 0), z_dir=(0, 1, 0))):
        with Locations((-51.5875, -3.175)):
            Rectangle(MIRROR1_COPY_36_SKETCH_W, MIRROR1_COPY_36_SKETCH_H)
    extrude(amount=-MIRROR1_COPY_36_DEPTH, mode=Mode.SUBTRACT)

    # Mirror1 copy 37 sketch → Mirror1 copy 37 (cut)
    with BuildSketch(Plane(origin=(0, 3.175, 12.7), x_dir=(-1, 0, 0), z_dir=(0, 1, 0))):
        with Locations((-51.5875, -3.175)):
            Rectangle(MIRROR1_COPY_37_SKETCH_W, MIRROR1_COPY_37_SKETCH_H)
    extrude(amount=-MIRROR1_COPY_37_DEPTH, mode=Mode.SUBTRACT)

    # Mirror1 copy 38 sketch → Mirror1 copy 38 (cut)
    with BuildSketch(Plane(origin=(0, 3.175, 6.35), x_dir=(-1, 0, 0), z_dir=(0, 1, 0))):
        with Locations((-51.5875, -3.175)):
            Rectangle(MIRROR1_COPY_38_SKETCH_W, MIRROR1_COPY_38_SKETCH_H)
    extrude(amount=-MIRROR1_COPY_38_DEPTH, mode=Mode.SUBTRACT)

    # Mirror1 copy 39 sketch → Mirror1 copy 39 (cut)
    with BuildSketch(Plane(origin=(0, 3.175, 0), x_dir=(-1, 0, 0), z_dir=(0, 1, 0))):
        with Locations((-51.5875, -3.175)):
            Rectangle(MIRROR1_COPY_39_SKETCH_W, MIRROR1_COPY_39_SKETCH_H)
    extrude(amount=-MIRROR1_COPY_39_DEPTH, mode=Mode.SUBTRACT)

    # Mirror1 copy 40 sketch → Mirror1 copy 40 (cut)
    with BuildSketch(Plane(origin=(0, 3.175, -6.35), x_dir=(-1, 0, 0), z_dir=(0, 1, 0))):
        with Locations((-51.5875, -3.175)):
            Rectangle(MIRROR1_COPY_40_SKETCH_W, MIRROR1_COPY_40_SKETCH_H)
    extrude(amount=-MIRROR1_COPY_40_DEPTH, mode=Mode.SUBTRACT)

    # Mirror1 copy 41 sketch → Mirror1 copy 41 (cut)
    with BuildSketch(Plane(origin=(0, 3.175, 38.1), x_dir=(-1, 0, 0), z_dir=(0, 1, 0))):
        with Locations((-51.5875, -3.175)):
            Rectangle(MIRROR1_COPY_41_SKETCH_W, MIRROR1_COPY_41_SKETCH_H)
    extrude(amount=-MIRROR1_COPY_41_DEPTH, mode=Mode.SUBTRACT)

    # Mirror1 copy 42 sketch → Mirror1 copy 42 (cut)
    with BuildSketch(Plane(origin=(0, 3.175, 31.75), x_dir=(-1, 0, 0), z_dir=(0, 1, 0))):
        with Locations((-51.5875, -3.175)):
            Rectangle(MIRROR1_COPY_42_SKETCH_W, MIRROR1_COPY_42_SKETCH_H)
    extrude(amount=-MIRROR1_COPY_42_DEPTH, mode=Mode.SUBTRACT)

    # Mirror1 copy 43 sketch → Mirror1 copy 43 (cut)
    with BuildSketch(Plane(origin=(0, 3.175, 25.4), x_dir=(-1, 0, 0), z_dir=(0, 1, 0))):
        with Locations((-51.5875, -3.175)):
            Rectangle(MIRROR1_COPY_43_SKETCH_W, MIRROR1_COPY_43_SKETCH_H)
    extrude(amount=-MIRROR1_COPY_43_DEPTH, mode=Mode.SUBTRACT)

    # Mirror1 copy 44 sketch → Mirror1 copy 44 (cut)
    with BuildSketch(Plane(origin=(0, 3.175, 19.05), x_dir=(-1, 0, 0), z_dir=(0, 1, 0))):
        with Locations((-51.5875, -3.175)):
            Rectangle(MIRROR1_COPY_44_SKETCH_W, MIRROR1_COPY_44_SKETCH_H)
    extrude(amount=-MIRROR1_COPY_44_DEPTH, mode=Mode.SUBTRACT)

    # Mirror1 copy 45 sketch → Mirror1 copy 45 (cut)
    with BuildSketch(Plane(origin=(0, 3.175, 12.7), x_dir=(-1, 0, 0), z_dir=(0, 1, 0))):
        with Locations((-51.5875, -3.175)):
            Rectangle(MIRROR1_COPY_45_SKETCH_W, MIRROR1_COPY_45_SKETCH_H)
    extrude(amount=-MIRROR1_COPY_45_DEPTH, mode=Mode.SUBTRACT)

    # Mirror1 copy 46 sketch → Mirror1 copy 46 (cut)
    with BuildSketch(Plane(origin=(0, 3.175, 6.35), x_dir=(-1, 0, 0), z_dir=(0, 1, 0))):
        with Locations((-51.5875, -3.175)):
            Rectangle(MIRROR1_COPY_46_SKETCH_W, MIRROR1_COPY_46_SKETCH_H)
    extrude(amount=-MIRROR1_COPY_46_DEPTH, mode=Mode.SUBTRACT)

    # Mirror1 copy 47 sketch → Mirror1 copy 47 (cut)
    with BuildSketch(Plane(origin=(0, 3.175, 0), x_dir=(-1, 0, 0), z_dir=(0, 1, 0))):
        with Locations((-51.5875, -3.175)):
            Rectangle(MIRROR1_COPY_47_SKETCH_W, MIRROR1_COPY_47_SKETCH_H)
    extrude(amount=-MIRROR1_COPY_47_DEPTH, mode=Mode.SUBTRACT)

    # Sketch7 → Boss-Extrude3 (add)
    # profile 1 of 2: a face of its own
    with BuildSketch(Plane(origin=(0, 3.175, 0), x_dir=(1, 0, 0), z_dir=(0, 1, 0))):
        with Locations((59.35, 0)):
            Rectangle(SKETCH7_W, SKETCH7_H)
        with Locations(Location((59.35, 31.5, 0), (0, 0, 270))):
            Circle(SKETCH7_R, mode=Mode.SUBTRACT)
        with Locations(Location((59.35, -31.5, 0), (0, 0, 270))):
            Circle(SKETCH7_R, mode=Mode.SUBTRACT)
    # profile 2 of 2: a face of its own
    with BuildSketch(Plane(origin=(0, 3.175, 0), x_dir=(1, 0, 0), z_dir=(0, 1, 0))):
        with Locations((-59.35, 0)):
            Rectangle(SKETCH7_W, SKETCH7_H)
        with Locations(Location((-59.35, 31.5, 0), (0, 0, 270))):
            Circle(SKETCH7_R, mode=Mode.SUBTRACT)
        with Locations(Location((-59.35, -31.5, 0), (0, 0, 270))):
            Circle(SKETCH7_R, mode=Mode.SUBTRACT)
    extrude(amount=-BOSS_EXTRUDE3_DEPTH)

    # Sketch8 → Boss-Extrude4 (add)
    with BuildSketch(Plane(origin=(0, 3.175, 0), x_dir=(1, 0, 0), z_dir=(0, 1, 0))):
        with Locations((-63.9375, 0)):
            Rectangle(SKETCH8_W, SKETCH8_H)
        with Locations((63.9375, 0)):
            Rectangle(SKETCH8_W, SKETCH8_H)
    extrude(amount=-BOSS_EXTRUDE4_DEPTH)

    # Sketch10 → Cut-Extrude4 (cut)
    with BuildSketch(Plane(origin=(0, 3.175, 0), x_dir=(1, 0, 0), z_dir=(0, 1, 0))):
        with Locations((-59.35, 0)):
            Rectangle(SKETCH10_W, SKETCH10_H)
        with Locations((59.35, 0)):
            Rectangle(SKETCH10_W, SKETCH10_H)
    extrude(amount=-CUT_EXTRUDE4_DEPTH, mode=Mode.SUBTRACT)


solid = part.part
